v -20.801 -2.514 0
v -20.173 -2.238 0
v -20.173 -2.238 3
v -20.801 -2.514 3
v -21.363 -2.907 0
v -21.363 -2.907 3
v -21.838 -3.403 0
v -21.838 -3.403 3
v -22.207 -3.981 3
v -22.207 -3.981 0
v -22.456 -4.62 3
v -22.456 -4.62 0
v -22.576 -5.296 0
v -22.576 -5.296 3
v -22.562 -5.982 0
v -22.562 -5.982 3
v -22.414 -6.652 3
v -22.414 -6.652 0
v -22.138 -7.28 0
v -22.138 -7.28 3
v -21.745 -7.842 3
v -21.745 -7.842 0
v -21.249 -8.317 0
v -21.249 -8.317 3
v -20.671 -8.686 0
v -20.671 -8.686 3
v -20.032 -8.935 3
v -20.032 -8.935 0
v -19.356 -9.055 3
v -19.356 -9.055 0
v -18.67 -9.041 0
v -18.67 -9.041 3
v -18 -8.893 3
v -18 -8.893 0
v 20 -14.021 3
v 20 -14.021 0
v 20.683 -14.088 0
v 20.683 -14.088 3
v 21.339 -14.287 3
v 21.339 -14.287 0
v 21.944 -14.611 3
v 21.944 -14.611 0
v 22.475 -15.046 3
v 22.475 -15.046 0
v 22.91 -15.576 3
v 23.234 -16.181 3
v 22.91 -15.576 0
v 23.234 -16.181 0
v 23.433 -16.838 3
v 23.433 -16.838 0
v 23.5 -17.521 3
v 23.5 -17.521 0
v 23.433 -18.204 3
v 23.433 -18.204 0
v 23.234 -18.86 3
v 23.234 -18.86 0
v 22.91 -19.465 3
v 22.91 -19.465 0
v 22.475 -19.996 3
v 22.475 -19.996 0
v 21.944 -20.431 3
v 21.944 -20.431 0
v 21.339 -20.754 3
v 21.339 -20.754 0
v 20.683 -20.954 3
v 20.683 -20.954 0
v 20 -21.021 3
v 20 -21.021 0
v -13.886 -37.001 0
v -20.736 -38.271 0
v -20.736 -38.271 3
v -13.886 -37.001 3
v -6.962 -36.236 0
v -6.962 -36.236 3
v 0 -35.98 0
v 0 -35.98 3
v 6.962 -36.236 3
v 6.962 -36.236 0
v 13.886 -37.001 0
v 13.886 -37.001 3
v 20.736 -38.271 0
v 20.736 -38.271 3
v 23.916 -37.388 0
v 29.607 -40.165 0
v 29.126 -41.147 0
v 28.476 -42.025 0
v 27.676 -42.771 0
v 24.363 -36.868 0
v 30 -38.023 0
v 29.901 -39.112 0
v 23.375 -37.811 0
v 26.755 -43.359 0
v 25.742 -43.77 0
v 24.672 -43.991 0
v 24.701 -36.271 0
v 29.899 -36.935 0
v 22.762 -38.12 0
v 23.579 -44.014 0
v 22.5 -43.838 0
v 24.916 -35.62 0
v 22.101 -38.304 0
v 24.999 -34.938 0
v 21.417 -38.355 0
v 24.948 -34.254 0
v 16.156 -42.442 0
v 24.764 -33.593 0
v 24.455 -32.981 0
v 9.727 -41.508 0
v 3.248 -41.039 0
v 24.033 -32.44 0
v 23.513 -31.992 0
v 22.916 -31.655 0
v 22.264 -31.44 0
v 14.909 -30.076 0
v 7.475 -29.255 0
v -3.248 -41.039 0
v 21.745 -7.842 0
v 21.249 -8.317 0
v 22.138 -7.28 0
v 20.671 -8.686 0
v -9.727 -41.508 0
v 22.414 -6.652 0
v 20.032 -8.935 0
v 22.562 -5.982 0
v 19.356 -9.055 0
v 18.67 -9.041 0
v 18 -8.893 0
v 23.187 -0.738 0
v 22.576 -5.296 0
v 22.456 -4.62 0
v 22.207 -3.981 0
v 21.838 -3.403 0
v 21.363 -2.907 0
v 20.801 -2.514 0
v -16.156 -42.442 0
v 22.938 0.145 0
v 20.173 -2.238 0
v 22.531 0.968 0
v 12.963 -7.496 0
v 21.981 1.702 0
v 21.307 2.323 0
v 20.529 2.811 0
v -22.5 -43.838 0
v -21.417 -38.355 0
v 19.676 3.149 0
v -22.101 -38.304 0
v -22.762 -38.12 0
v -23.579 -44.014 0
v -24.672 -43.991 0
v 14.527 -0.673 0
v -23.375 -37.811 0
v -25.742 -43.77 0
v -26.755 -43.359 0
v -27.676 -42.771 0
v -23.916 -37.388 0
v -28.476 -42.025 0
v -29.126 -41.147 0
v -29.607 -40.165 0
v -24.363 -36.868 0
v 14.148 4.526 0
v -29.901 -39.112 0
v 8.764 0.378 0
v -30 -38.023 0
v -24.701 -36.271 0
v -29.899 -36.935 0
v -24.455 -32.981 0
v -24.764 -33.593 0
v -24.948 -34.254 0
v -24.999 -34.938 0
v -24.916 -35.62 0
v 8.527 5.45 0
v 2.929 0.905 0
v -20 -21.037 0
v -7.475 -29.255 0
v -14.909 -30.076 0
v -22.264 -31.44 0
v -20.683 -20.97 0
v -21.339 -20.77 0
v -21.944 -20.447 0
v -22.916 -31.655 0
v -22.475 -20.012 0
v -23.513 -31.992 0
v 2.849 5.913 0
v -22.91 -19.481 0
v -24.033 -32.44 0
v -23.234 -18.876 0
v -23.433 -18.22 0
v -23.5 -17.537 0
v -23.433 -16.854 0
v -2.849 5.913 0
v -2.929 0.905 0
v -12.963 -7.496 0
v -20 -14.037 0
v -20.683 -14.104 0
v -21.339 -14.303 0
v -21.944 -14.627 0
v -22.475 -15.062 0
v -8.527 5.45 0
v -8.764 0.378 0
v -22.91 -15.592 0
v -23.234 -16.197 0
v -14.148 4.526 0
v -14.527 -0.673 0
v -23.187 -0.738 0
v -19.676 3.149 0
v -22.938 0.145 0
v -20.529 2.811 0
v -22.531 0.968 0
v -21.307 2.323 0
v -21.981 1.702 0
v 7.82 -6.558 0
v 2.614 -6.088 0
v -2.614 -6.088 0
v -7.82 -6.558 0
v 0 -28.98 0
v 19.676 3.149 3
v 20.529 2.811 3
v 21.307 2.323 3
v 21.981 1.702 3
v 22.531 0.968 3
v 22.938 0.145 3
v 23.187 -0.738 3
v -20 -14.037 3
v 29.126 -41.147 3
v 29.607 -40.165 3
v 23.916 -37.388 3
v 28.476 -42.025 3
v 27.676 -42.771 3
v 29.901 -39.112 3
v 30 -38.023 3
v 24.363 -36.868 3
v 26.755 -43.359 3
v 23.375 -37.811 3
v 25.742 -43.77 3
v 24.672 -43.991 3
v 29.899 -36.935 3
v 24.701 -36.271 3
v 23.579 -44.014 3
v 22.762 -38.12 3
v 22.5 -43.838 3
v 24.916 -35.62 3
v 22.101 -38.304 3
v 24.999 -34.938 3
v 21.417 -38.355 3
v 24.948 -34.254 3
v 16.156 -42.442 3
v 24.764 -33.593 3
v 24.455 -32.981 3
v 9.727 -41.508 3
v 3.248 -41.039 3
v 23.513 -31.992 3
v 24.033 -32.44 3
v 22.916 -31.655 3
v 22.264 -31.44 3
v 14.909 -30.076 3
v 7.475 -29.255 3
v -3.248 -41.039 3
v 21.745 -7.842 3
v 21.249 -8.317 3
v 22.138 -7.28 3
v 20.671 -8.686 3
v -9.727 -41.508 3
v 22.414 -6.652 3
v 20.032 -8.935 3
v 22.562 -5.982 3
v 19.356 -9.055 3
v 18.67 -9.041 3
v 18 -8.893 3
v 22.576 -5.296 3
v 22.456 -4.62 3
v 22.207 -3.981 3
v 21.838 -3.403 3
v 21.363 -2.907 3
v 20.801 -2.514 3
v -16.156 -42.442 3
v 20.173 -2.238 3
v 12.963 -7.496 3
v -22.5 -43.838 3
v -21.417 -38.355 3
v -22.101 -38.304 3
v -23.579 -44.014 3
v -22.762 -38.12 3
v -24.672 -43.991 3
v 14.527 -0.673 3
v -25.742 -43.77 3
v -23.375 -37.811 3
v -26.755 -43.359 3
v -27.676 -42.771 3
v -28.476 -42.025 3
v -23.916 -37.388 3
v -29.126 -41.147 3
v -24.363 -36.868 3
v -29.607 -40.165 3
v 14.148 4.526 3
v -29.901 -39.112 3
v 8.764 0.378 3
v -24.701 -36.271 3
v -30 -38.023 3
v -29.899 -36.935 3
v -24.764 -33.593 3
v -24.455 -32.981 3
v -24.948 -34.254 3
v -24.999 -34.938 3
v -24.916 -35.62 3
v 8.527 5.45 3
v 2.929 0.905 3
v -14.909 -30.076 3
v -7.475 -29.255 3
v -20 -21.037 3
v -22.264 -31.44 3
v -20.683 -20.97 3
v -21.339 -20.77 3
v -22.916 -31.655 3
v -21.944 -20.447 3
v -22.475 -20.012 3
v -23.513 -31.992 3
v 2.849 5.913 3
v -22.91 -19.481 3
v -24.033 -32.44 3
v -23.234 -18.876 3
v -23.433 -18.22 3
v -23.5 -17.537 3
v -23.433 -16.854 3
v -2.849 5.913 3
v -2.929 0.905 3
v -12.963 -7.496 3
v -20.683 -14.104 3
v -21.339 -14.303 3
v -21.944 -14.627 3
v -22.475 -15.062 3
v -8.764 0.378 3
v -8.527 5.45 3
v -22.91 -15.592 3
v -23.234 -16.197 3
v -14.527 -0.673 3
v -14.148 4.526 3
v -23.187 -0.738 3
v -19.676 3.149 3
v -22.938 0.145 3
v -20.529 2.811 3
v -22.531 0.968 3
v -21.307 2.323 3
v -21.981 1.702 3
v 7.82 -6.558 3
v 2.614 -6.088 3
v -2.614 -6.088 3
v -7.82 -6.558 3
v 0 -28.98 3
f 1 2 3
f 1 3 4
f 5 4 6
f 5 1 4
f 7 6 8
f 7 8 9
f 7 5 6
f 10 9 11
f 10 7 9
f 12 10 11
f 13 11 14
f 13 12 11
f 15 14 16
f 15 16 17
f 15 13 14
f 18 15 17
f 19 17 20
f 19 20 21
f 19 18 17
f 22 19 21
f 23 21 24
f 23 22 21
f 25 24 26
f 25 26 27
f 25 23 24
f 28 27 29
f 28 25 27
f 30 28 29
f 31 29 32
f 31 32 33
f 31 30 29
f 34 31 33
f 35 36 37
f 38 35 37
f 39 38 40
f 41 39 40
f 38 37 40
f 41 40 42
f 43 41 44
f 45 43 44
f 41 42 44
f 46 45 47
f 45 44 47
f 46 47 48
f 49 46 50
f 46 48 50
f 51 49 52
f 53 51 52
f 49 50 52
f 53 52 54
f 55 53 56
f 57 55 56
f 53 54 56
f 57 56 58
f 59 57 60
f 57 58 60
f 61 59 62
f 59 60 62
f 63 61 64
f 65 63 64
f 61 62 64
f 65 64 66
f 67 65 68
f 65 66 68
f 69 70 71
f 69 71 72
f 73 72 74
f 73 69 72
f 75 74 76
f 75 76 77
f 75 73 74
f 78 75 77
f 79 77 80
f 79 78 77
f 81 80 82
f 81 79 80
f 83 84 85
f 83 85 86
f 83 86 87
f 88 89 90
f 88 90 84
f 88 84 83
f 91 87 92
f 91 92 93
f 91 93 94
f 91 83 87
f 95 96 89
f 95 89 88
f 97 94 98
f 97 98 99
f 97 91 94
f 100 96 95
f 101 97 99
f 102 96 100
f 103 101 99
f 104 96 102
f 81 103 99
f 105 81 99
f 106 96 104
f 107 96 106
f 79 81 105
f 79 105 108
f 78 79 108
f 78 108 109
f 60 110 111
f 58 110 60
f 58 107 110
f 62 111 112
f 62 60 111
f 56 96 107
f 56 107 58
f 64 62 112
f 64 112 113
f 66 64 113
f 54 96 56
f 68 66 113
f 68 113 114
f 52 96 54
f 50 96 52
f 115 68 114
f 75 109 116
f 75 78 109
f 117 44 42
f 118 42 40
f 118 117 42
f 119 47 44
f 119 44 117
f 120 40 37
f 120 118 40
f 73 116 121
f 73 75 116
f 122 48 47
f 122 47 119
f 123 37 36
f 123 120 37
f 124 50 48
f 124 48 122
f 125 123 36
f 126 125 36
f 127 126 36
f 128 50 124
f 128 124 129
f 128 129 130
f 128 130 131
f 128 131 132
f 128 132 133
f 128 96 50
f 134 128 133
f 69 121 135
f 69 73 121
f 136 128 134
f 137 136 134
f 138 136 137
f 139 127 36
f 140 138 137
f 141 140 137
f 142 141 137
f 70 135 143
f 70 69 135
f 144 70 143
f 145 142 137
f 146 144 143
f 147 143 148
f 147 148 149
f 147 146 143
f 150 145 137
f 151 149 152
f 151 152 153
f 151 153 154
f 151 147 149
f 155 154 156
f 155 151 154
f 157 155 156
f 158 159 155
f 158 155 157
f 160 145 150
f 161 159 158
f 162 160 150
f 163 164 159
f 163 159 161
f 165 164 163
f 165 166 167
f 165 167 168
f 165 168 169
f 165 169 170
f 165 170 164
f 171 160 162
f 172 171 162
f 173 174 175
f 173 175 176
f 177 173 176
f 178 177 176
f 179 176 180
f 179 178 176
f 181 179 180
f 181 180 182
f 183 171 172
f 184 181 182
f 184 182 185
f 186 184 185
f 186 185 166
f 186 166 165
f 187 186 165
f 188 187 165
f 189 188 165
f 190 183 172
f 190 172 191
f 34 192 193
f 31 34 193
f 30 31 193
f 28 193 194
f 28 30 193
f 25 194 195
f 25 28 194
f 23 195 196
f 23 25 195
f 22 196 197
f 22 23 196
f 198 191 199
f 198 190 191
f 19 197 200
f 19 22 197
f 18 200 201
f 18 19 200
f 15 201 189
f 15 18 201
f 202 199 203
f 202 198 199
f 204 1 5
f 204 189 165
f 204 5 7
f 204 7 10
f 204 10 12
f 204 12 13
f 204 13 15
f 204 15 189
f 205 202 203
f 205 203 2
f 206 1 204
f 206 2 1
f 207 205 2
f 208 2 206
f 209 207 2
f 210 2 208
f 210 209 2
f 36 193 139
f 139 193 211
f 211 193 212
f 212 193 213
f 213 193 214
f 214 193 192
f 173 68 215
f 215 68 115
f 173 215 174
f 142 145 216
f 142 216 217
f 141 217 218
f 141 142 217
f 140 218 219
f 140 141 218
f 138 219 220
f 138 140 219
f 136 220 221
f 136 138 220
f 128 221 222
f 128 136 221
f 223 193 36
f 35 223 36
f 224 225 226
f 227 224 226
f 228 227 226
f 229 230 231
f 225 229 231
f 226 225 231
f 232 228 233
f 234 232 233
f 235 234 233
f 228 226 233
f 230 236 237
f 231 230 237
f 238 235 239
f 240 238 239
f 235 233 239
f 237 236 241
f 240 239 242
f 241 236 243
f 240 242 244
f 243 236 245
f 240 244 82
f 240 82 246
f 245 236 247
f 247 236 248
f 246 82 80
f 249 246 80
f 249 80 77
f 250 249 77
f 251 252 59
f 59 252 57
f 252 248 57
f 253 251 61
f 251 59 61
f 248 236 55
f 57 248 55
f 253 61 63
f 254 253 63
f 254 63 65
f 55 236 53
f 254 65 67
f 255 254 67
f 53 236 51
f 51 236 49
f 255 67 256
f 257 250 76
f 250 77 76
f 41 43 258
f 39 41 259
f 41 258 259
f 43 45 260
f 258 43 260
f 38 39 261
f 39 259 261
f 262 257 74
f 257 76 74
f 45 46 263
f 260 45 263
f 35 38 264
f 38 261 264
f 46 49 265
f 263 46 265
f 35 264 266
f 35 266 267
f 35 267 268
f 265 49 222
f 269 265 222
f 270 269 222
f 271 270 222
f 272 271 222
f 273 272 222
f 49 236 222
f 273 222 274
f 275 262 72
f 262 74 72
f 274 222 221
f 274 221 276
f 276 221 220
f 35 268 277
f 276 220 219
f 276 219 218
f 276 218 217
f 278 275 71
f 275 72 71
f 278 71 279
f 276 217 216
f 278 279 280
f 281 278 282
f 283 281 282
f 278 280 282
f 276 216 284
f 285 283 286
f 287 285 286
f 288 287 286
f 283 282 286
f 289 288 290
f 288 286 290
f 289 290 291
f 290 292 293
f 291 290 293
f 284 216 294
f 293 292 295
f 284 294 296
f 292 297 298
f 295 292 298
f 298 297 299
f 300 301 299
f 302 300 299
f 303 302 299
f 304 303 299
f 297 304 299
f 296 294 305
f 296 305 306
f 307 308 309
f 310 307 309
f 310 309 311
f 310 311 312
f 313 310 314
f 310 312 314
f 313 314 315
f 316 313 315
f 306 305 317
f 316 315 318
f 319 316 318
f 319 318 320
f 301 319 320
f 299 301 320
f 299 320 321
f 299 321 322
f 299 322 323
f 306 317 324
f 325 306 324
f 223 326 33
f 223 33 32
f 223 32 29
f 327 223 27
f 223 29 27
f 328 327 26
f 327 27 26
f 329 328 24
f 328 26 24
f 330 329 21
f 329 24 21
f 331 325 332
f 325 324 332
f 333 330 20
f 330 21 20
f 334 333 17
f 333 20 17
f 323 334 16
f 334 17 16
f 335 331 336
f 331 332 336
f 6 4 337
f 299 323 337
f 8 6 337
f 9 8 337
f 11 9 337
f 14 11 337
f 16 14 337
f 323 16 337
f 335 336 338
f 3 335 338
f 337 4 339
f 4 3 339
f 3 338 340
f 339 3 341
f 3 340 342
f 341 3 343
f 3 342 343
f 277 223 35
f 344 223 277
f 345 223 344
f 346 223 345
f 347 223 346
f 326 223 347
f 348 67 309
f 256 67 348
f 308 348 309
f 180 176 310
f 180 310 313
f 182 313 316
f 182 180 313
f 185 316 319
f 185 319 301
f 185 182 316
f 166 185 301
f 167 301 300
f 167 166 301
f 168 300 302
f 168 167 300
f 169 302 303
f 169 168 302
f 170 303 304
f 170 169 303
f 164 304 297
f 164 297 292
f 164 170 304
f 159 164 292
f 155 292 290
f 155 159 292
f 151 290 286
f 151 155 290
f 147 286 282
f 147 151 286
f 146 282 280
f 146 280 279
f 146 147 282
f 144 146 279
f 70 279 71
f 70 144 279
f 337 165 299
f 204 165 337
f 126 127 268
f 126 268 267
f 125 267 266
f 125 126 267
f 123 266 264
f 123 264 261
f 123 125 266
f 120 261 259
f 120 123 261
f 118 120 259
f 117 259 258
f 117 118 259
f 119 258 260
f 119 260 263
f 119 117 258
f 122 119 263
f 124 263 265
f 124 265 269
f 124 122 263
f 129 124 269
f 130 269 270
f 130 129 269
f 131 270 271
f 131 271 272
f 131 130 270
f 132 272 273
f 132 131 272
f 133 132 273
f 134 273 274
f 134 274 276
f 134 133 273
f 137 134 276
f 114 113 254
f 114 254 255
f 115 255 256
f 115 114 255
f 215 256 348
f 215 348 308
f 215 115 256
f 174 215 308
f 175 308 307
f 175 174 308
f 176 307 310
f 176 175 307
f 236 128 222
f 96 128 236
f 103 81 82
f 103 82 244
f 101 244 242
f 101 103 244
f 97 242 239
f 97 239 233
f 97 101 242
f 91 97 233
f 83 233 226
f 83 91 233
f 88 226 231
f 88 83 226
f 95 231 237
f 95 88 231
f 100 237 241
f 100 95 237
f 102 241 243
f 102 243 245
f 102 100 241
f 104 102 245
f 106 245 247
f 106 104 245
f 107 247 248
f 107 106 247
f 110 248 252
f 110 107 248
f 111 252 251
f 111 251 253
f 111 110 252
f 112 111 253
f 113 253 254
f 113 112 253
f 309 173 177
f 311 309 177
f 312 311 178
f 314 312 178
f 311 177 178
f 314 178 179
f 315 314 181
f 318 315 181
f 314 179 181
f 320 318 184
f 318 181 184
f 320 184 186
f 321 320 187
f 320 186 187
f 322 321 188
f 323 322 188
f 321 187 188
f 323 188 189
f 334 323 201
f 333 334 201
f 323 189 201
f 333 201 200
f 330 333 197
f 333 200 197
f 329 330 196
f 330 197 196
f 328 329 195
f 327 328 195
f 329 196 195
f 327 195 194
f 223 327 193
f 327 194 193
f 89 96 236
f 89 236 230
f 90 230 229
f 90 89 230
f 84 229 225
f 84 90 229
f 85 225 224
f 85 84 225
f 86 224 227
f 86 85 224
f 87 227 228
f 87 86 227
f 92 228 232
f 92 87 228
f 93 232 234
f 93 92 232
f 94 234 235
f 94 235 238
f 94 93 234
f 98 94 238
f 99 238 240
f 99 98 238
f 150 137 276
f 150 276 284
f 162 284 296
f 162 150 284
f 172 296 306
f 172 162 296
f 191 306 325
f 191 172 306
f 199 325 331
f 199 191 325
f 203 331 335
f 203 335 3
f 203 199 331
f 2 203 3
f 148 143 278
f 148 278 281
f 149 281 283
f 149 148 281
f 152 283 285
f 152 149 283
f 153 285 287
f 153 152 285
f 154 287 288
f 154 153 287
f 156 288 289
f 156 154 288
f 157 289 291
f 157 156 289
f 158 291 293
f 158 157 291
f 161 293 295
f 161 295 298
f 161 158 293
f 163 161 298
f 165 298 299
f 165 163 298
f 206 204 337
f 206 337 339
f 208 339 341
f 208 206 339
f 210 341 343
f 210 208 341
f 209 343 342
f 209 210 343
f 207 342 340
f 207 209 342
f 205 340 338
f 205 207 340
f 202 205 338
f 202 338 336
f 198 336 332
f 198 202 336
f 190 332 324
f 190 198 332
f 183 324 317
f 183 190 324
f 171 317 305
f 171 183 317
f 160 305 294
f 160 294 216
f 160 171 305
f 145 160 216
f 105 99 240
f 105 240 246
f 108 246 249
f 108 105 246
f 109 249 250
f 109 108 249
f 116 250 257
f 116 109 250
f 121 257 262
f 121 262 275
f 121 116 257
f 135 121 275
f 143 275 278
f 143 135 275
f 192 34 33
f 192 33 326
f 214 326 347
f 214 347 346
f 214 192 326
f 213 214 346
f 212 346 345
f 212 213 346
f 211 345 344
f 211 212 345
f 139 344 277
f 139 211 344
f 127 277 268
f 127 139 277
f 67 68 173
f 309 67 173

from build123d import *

# Parameters (mm, degrees)
BOSS_EXTRUDE4_DEPTH = 3


with BuildPart() as part:
    # Sketch1 → Boss-Extrude4 (new body)
    with BuildSketch(Plane.XY):
        with BuildLine():
            Line((-29.899423372, -36.934875117), (-23.187084604, -0.737928439))
            ThreePointArc((-23.187084604, -0.737928439), (-21.98135558, 1.701910522), (-19.676352188, 3.148823096))
            ThreePointArc((-19.676352188, 3.148823096), (0, 5.971139565), (19.676352188, 3.148823096))
            ThreePointArc((19.676352188, 3.148823096), (21.98135558, 1.701910522), (23.187084604, -0.737928439))
            Line((23.187084604, -0.737928439), (29.899423372, -36.934875117))
            ThreePointArc((29.899423372, -36.934875117), (28.093063969, -42.415981056), (22.5, -43.838335454))
            ThreePointArc((22.5, -43.838335454), (0, -40.980460744), (-22.5, -43.838335454))
            ThreePointArc((-22.5, -43.838335454), (-28.093063969, -42.415981056), (-29.899423372, -36.934875117))
        make_face()
        with BuildLine():
            Line((-19.999993368, -14.036878488), (20.000003419, -14.020845591))
            ThreePointArc((20.000003419, -14.020845591), (23.500003419, -17.520845591), (20.000003419, -21.020845591))
            Line((20.000003419, -21.020845591), (-19.999993368, -21.036878488))
            ThreePointArc((-19.999993368, -21.036878488), (-23.499993368, -17.536878488), (-19.999993368, -14.036878488))
        make_face(mode=Mode.SUBTRACT)
        with BuildLine():
            ThreePointArc((20.172628238, -2.238367072), (0, 0.971139565), (-20.172628238, -2.238367072))
            ThreePointArc((-20.172628238, -2.238367072), (-22.413590206, -6.651765928), (-18.000191351, -8.892727896))
            ThreePointArc((-18.000191351, -8.892727896), (0, -6.028860435), (18.000191351, -8.892727896))
            ThreePointArc((18.000191351, -8.892727896), (22.413590206, -6.651765928), (20.172628238, -2.238367072))
        make_face(mode=Mode.SUBTRACT)
        with BuildLine():
            ThreePointArc((22.263959391, -31.439935769), (0, -28.980460744), (-22.263959391, -31.439935769))
            ThreePointArc((-22.263959391, -31.439935769), (-24.915606249, -35.619501409), (-20.736040609, -38.271148267))
            ThreePointArc((-20.736040609, -38.271148267), (0, -35.980460744), (20.736040609, -38.271148267))
            ThreePointArc((20.736040609, -38.271148267), (24.915606249, -35.619501409), (22.263959391, -31.439935769))
        make_face(mode=Mode.SUBTRACT)
    extrude(amount=BOSS_EXTRUDE4_DEPTH)


solid = part.part
